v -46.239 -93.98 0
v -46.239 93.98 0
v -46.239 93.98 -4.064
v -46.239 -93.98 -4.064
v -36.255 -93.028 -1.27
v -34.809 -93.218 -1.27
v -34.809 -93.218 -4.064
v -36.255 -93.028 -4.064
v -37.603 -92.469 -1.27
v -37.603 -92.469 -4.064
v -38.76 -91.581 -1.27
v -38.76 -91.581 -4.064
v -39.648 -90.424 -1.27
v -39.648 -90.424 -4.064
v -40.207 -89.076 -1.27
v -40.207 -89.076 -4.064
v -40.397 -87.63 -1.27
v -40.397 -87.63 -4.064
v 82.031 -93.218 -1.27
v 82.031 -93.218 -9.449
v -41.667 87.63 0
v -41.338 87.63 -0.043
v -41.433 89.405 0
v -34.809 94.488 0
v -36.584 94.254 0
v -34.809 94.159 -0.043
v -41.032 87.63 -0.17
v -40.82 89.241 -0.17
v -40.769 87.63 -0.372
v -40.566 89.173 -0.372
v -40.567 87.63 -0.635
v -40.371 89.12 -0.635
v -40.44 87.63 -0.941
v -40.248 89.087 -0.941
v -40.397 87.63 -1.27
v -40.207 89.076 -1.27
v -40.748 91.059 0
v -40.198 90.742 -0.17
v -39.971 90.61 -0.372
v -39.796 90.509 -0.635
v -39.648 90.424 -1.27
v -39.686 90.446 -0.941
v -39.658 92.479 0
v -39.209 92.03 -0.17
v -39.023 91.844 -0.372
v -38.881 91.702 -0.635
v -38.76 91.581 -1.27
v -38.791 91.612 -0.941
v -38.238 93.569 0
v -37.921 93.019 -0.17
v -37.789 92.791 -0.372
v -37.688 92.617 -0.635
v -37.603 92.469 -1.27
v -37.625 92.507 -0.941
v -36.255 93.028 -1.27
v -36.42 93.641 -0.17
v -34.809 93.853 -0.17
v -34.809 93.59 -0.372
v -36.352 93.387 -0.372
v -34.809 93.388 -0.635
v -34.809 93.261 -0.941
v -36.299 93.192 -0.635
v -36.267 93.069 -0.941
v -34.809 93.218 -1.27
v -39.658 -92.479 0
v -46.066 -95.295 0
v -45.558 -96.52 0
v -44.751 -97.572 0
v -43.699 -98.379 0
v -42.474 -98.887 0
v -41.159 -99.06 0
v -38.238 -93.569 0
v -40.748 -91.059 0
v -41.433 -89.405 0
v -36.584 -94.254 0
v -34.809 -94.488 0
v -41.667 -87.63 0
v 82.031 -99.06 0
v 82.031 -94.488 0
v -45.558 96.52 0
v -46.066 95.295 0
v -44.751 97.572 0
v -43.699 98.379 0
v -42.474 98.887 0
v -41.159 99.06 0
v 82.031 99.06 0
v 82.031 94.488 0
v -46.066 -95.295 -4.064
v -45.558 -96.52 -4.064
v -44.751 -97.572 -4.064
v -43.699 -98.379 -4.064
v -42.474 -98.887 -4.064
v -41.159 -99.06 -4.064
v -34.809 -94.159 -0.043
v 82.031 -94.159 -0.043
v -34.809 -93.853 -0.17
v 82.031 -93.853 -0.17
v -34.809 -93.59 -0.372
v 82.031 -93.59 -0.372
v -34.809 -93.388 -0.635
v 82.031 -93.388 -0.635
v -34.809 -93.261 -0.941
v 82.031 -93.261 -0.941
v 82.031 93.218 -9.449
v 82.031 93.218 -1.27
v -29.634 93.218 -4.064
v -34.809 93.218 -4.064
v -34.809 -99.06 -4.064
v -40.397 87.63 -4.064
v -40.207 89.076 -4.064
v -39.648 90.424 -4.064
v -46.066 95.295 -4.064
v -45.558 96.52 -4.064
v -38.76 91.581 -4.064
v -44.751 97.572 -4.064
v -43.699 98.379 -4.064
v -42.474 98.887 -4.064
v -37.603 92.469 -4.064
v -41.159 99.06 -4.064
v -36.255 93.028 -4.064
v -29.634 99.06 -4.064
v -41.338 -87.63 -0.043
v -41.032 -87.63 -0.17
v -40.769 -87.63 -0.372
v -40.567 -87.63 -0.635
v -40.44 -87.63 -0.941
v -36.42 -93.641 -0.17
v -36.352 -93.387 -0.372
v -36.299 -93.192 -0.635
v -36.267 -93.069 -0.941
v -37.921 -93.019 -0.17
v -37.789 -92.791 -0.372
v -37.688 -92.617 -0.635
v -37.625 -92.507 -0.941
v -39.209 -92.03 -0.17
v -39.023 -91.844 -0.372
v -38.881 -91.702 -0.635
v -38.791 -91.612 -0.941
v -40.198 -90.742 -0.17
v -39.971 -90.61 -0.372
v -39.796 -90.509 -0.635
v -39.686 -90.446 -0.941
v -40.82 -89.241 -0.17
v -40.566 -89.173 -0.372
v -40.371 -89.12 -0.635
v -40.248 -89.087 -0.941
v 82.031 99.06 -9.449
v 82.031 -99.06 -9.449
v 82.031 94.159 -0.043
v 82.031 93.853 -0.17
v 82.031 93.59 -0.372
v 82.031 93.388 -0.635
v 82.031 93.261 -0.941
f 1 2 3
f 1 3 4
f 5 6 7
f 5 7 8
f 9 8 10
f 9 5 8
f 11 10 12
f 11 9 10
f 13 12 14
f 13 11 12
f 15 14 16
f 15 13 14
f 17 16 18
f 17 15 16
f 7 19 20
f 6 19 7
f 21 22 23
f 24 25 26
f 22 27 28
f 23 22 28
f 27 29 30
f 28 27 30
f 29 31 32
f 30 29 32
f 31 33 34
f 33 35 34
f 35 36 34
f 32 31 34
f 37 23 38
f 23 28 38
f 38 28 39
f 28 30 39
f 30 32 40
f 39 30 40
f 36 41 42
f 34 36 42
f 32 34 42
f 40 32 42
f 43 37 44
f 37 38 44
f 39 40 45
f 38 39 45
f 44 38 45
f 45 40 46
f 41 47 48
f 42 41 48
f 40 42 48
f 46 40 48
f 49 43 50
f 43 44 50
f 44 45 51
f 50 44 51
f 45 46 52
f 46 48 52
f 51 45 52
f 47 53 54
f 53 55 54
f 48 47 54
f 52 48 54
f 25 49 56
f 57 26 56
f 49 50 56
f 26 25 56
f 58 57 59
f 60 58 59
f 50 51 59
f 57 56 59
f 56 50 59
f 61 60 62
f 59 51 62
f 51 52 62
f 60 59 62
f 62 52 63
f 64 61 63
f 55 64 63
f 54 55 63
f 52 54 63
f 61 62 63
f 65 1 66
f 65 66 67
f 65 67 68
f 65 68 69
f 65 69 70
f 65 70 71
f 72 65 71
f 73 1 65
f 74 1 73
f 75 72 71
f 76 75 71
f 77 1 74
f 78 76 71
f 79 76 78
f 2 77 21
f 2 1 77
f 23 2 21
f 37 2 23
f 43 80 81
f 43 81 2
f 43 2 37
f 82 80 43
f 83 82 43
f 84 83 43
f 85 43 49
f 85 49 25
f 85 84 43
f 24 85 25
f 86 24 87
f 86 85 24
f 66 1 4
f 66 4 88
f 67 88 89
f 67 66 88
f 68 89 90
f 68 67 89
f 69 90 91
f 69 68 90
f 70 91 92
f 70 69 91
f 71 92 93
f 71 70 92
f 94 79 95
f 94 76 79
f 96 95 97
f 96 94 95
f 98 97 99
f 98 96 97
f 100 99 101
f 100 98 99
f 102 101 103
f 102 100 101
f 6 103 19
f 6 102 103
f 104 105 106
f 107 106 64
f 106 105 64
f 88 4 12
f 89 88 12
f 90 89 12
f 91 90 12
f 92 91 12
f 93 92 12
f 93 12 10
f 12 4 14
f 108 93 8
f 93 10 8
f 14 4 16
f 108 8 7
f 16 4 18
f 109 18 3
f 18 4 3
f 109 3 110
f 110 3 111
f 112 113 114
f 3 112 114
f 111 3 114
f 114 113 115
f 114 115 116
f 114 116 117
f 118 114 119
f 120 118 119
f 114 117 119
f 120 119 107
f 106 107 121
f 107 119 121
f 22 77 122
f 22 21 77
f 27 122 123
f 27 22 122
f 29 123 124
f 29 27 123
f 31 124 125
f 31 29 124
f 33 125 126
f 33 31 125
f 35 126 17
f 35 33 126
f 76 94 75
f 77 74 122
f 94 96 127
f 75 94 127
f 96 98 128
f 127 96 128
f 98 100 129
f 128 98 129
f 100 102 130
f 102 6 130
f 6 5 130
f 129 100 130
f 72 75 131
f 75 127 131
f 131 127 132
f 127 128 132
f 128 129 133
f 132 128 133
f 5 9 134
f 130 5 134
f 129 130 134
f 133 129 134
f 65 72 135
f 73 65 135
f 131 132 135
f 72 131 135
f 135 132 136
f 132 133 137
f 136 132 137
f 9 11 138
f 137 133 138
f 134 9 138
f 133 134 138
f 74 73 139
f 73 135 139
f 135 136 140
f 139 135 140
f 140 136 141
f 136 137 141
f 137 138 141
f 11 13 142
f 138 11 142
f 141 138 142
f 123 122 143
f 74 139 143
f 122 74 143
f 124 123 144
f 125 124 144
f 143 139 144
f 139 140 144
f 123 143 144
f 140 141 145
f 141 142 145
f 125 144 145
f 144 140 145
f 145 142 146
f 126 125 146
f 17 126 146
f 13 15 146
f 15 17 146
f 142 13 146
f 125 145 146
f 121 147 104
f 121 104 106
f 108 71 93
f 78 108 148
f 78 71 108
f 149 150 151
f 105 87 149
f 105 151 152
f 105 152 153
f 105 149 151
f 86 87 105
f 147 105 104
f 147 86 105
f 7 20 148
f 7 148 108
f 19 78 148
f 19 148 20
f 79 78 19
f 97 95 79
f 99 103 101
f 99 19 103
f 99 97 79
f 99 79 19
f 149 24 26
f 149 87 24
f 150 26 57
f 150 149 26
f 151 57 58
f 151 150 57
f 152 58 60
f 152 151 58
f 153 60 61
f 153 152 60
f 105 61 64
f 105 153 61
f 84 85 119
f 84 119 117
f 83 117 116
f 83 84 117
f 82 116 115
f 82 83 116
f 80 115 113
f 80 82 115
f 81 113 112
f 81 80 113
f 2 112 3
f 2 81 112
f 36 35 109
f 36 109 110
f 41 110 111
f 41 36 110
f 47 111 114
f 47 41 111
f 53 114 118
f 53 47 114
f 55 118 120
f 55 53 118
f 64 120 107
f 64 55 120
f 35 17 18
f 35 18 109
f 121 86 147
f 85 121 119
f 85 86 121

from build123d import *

# Parameters (mm, degrees)
F1_DEPTH = 4.064
F4_DEPTH = 5.842
F6_DEPTH = 5.842
F7_R     = 1.27


with BuildPart() as f1:
    # F0 (on Top) → F1 (new body)
    with BuildSketch(Plane.XY):
        with BuildLine():
            Line((-41.15909, -99.06), (82.03091, -99.06))
            Line((82.03091, -99.06), (82.03091, -93.218))
            Line((82.03091, -93.218), (-34.80909, -93.218))
            ThreePointArc((-34.80909, -93.218), (-38.760403, -91.581313), (-40.39709, -87.63))
            Line((-40.39709, -87.63), (-40.39709, 87.63))
            ThreePointArc((-40.39709, 87.63), (-38.760403, 91.581313), (-34.80909, 93.218))
            Line((-34.80909, 93.218), (82.03091, 93.218))
            Line((82.03091, 93.218), (82.03091, 99.06))
            Line((82.03091, 99.06), (-41.15909, 99.06))
            ThreePointArc((-41.15909, 99.06), (-44.751192, 97.572102), (-46.23909, 93.98))
            Line((-46.23909, 93.98), (-46.23909, -93.98))
            ThreePointArc((-46.23909, -93.98), (-44.751192, -97.572102), (-41.15909, -99.06))
        make_face()
    extrude(amount=-F1_DEPTH)

    # F3 (on face) → F4 (join, through all)
    with BuildSketch(Plane(origin=(0, 99.06, 0), x_dir=(-1, 0, 0), z_dir=(0, 1, 0))):
        Polygon((29.633703, -4.064), (-82.03091, -4.064), (-82.03091, -9.4488), align=None)
    extrude(amount=-F4_DEPTH)

    # F5 (on face) → F6 (join)
    with BuildSketch(Plane(origin=(0, -93.218, 0), x_dir=(-1, 0, 0), z_dir=(0, 1, 0))):
        Polygon((34.80909, 0), (-82.03091, 0), (-82.03091, -9.4488), (34.80909, -4.064), align=None)
    extrude(amount=-F6_DEPTH)

    # F7
    f7_edges = [f1.edges().sort_by_distance(p)[0] for p in [
        (23.61091, 93.218, 0),
    ]]
    fillet(f7_edges, radius=F7_R)


solid = f1.part
